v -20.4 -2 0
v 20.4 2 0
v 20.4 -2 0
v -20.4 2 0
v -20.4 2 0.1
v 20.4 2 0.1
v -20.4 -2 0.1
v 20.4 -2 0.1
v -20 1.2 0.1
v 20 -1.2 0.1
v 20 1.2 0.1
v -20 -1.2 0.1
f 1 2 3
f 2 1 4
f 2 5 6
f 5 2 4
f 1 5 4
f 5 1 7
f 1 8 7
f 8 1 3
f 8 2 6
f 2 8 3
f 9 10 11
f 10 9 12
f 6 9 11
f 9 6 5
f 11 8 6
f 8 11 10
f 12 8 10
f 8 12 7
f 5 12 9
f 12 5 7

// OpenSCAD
// file: ../p/4-4edge.scad
use <../lib.scad>
$fa=1; $fs=0.2;
function ldraw_lib__4_4edge(realsolid=false) = [
// 0 Circle 1.0
// 0 Name: 4-4edge.dat
// 0 Author: James Jessiman
// 0 !LDRAW_ORG Primitive UPDATE 2017-01
// 0 !LICENSE Licensed under CC BY 2.0 and CC BY 4.0 : see CAreadme.txt
// 
// 0 BFC CERTIFY CCW
  [0,"BFC","CERTIFY"],
  [0,"BFC","CCW"],
// 
// 0 !HISTORY 1998-12-15 [PTadmin] Official Update 1998-10
// 0 !HISTORY 2005-12-28 [PTadmin] Official Update 2005-01
// 0 !HISTORY 2007-06-24 [PTadmin] Header formatted for Contributor Agreement
// 0 !HISTORY 2008-07-01 [PTadmin] Official Update 2008-01
// 0 !HISTORY 2017-01-15 [Steffen] BFCed
// 0 !HISTORY 2017-12-30 [PTadmin] Official Update 2017-01
// 
// 
// 2 24 1 0 0 0.9239 0 0.3827
  [2,24,1,0,0,0.9239,0,0.3827],
// 2 24 0.9239 0 0.3827 0.7071 0 0.7071
  [2,24,0.9239,0,0.3827,0.7071,0,0.7071],
// 2 24 0.7071 0 0.7071 0.3827 0 0.9239
  [2,24,0.7071,0,0.7071,0.3827,0,0.9239],
// 2 24 0.3827 0 0.9239 0 0 1
  [2,24,0.3827,0,0.9239,0,0,1],
// 2 24 0 0 1 -0.3827 0 0.9239
  [2,24,0,0,1,-0.3827,0,0.9239],
// 2 24 -0.3827 0 0.9239 -0.7071 0 0.7071
  [2,24,-0.3827,0,0.9239,-0.7071,0,0.7071],
// 2 24 -0.7071 0 0.7071 -0.9239 0 0.3827
  [2,24,-0.7071,0,0.7071,-0.9239,0,0.3827],
// 2 24 -0.9239 0 0.3827 -1 0 -0
  [2,24,-0.9239,0,0.3827,-1,0,-0],
// 2 24 -1 0 -0 -0.9239 0 -0.3827
  [2,24,-1,0,-0,-0.9239,0,-0.3827],
// 2 24 -0.9239 0 -0.3827 -0.7071 0 -0.7071
  [2,24,-0.9239,0,-0.3827,-0.7071,0,-0.7071],
// 2 24 -0.7071 0 -0.7071 -0.3827 0 -0.9239
  [2,24,-0.7071,0,-0.7071,-0.3827,0,-0.9239],
// 2 24 -0.3827 0 -0.9239 0 0 -1
  [2,24,-0.3827,0,-0.9239,0,0,-1],
// 2 24 0 0 -1 0.3827 0 -0.9239
  [2,24,0,0,-1,0.3827,0,-0.9239],
// 2 24 0.3827 0 -0.9239 0.7071 0 -0.7071
  [2,24,0.3827,0,-0.9239,0.7071,0,-0.7071],
// 2 24 0.7071 0 -0.7071 0.9239 0 -0.3827
  [2,24,0.7071,0,-0.7071,0.9239,0,-0.3827],
// 2 24 0.9239 0 -0.3827 1 0 0
  [2,24,0.9239,0,-0.3827,1,0,0],
];
module ldraw_lib__4_4edge(step=0, col=false, unit=2/5, alt=false, line=0.2, solid=!$preview)
    makepoly(ldraw_lib__4_4edge(solid), step=step, col=col, unit=unit, alt=alt, line=line, solid=solid);
ldraw_lib__4_4edge(line=0.2);
// file: ../p/4-4disc.scad
use <../lib.scad>
$fa=1; $fs=0.2;
function ldraw_lib__4_4disc(realsolid=false) = [
// 0 Disc 1.0
// 0 Name: 4-4disc.dat
// 0 Author: James Jessiman
// 0 !LDRAW_ORG Primitive UPDATE 2002-02
// 0 !LICENSE Licensed under CC BY 2.0 and CC BY 4.0 : see CAreadme.txt
// 
// 0 BFC CERTIFY CCW
  [0,"BFC","CERTIFY"],
  [0,"BFC","CCW"],
// 
// 0 !HISTORY 1998-12-15 [PTadmin] Official Update 1998-10
// 0 !HISTORY 2002-03-23 [sbliss] Added BFC statement
// 0 !HISTORY 2002-04-25 [PTadmin] Official Update 2002-02
// 0 !HISTORY 2007-06-24 [PTadmin] Header formatted for Contributor Agreement
// 0 !HISTORY 2008-07-01 [PTadmin] Official Update 2008-01
// 
// 
// 3 16 0 0 0 1 0 0 0.9239 0 0.3827
  [3,16,0,0,0,1,0,0,0.9239,0,0.3827],
// 3 16 0 0 0 0.9239 0 0.3827 0.7071 0 0.7071
  [3,16,0,0,0,0.9239,0,0.3827,0.7071,0,0.7071],
// 3 16 0 0 0 0.7071 0 0.7071 0.3827 0 0.9239
  [3,16,0,0,0,0.7071,0,0.7071,0.3827,0,0.9239],
// 3 16 0 0 0 0.3827 0 0.9239 0 0 1
  [3,16,0,0,0,0.3827,0,0.9239,0,0,1],
// 3 16 0 0 0 0 0 1 -0.3827 0 0.9239
  [3,16,0,0,0,0,0,1,-0.3827,0,0.9239],
// 3 16 0 0 0 -0.3827 0 0.9239 -0.7071 0 0.7071
  [3,16,0,0,0,-0.3827,0,0.9239,-0.7071,0,0.7071],
// 3 16 0 0 0 -0.7071 0 0.7071 -0.9239 0 0.3827
  [3,16,0,0,0,-0.7071,0,0.7071,-0.9239,0,0.3827],
// 3 16 0 0 0 -0.9239 0 0.3827 -1 0 -0
  [3,16,0,0,0,-0.9239,0,0.3827,-1,0,-0],
// 3 16 0 0 0 -1 0 -0 -0.9239 0 -0.3827
  [3,16,0,0,0,-1,0,-0,-0.9239,0,-0.3827],
// 3 16 0 0 0 -0.9239 0 -0.3827 -0.7071 0 -0.7071
  [3,16,0,0,0,-0.9239,0,-0.3827,-0.7071,0,-0.7071],
// 3 16 0 0 0 -0.7071 0 -0.7071 -0.3827 0 -0.9239
  [3,16,0,0,0,-0.7071,0,-0.7071,-0.3827,0,-0.9239],
// 3 16 0 0 0 -0.3827 0 -0.9239 0 0 -1
  [3,16,0,0,0,-0.3827,0,-0.9239,0,0,-1],
// 3 16 0 0 0 0 0 -1 0.3827 0 -0.9239
  [3,16,0,0,0,0,0,-1,0.3827,0,-0.9239],
// 3 16 0 0 0 0.3827 0 -0.9239 0.7071 0 -0.7071
  [3,16,0,0,0,0.3827,0,-0.9239,0.7071,0,-0.7071],
// 3 16 0 0 0 0.7071 0 -0.7071 0.9239 0 -0.3827
  [3,16,0,0,0,0.7071,0,-0.7071,0.9239,0,-0.3827],
// 3 16 0 0 0 0.9239 0 -0.3827 1 0 0
  [3,16,0,0,0,0.9239,0,-0.3827,1,0,0],
// 0
];
module ldraw_lib__4_4disc(step=0, col=false, unit=2/5, alt=false, line=0.2, solid=!$preview)
    makepoly(ldraw_lib__4_4disc(solid), step=step, col=col, unit=unit, alt=alt, line=line, solid=solid);
ldraw_lib__4_4disc(line=0.2);
// file: ../p/4-4cyli.scad
use <../lib.scad>
$fa=1; $fs=0.2;
function ldraw_lib__4_4cyli(realsolid=false) = [
// 0 Cylinder 1.0
// 0 Name: 4-4cyli.dat
// 0 Author: James Jessiman
// 0 !LDRAW_ORG Primitive UPDATE 2005-01
// 0 !LICENSE Licensed under CC BY 2.0 and CC BY 4.0 : see CAreadme.txt
// 
// 0 BFC CERTIFY CCW
  [0,"BFC","CERTIFY"],
  [0,"BFC","CCW"],
// 
// 0 !HISTORY 1998-12-15 [PTadmin] Official Update 1998-10
// 0 !HISTORY 2002-03-23 [sbliss] Added BFC statement; merged headers from files in distributions LDraw 0.27 and Complete.
// 0 !HISTORY 2002-04-25 [PTadmin] Official Update 2002-02
// 0 !HISTORY 2004-12-14 [guyvivan] BFC CCW
// 0 !HISTORY 2005-12-28 [PTadmin] Official Update 2005-01
// 0 !HISTORY 2007-06-24 [PTadmin] Header formatted for Contributor Agreement
// 0 !HISTORY 2008-07-01 [PTadmin] Official Update 2008-01
// 
// 
// 4 16 1 1 0 0.9239 1 0.3827 0.9239 0 0.3827 1 0 0
  [4,16,1,1,0,0.9239,1,0.3827,0.9239,0,0.3827,1,0,0],
// 5 24 1 0 0 1 1 0 0.9239 0 0.3827 0.9239 0 -0.3827
  [5,24,1,0,0,1,1,0,0.9239,0,0.3827,0.9239,0,-0.3827],
// 4 16 0.9239 1 0.3827 0.7071 1 0.7071 0.7071 0 0.7071 0.9239 0 0.3827
  [4,16,0.9239,1,0.3827,0.7071,1,0.7071,0.7071,0,0.7071,0.9239,0,0.3827],
// 5 24 0.9239 0 0.3827 0.9239 1 0.3827 0.7071 0 0.7071 1 0 0
  [5,24,0.9239,0,0.3827,0.9239,1,0.3827,0.7071,0,0.7071,1,0,0],
// 4 16 0.7071 1 0.7071 0.3827 1 0.9239 0.3827 0 0.9239 0.7071 0 0.7071
  [4,16,0.7071,1,0.7071,0.3827,1,0.9239,0.3827,0,0.9239,0.7071,0,0.7071],
// 5 24 0.7071 0 0.7071 0.7071 1 0.7071 0.3827 0 0.9239 0.9239 0 0.3827
  [5,24,0.7071,0,0.7071,0.7071,1,0.7071,0.3827,0,0.9239,0.9239,0,0.3827],
// 4 16 0.3827 1 0.9239 0 1 1 0 0 1 0.3827 0 0.9239
  [4,16,0.3827,1,0.9239,0,1,1,0,0,1,0.3827,0,0.9239],
// 5 24 0.3827 0 0.9239 0.3827 1 0.9239 0 0 1 0.7071 0 0.7071
  [5,24,0.3827,0,0.9239,0.3827,1,0.9239,0,0,1,0.7071,0,0.7071],
// 4 16 0 1 1 -0.3827 1 0.9239 -0.3827 0 0.9239 0 0 1
  [4,16,0,1,1,-0.3827,1,0.9239,-0.3827,0,0.9239,0,0,1],
// 5 24 0 0 1 0 1 1 -0.3827 0 0.9239 0.3827 0 0.9239
  [5,24,0,0,1,0,1,1,-0.3827,0,0.9239,0.3827,0,0.9239],
// 4 16 -0.3827 1 0.9239 -0.7071 1 0.7071 -0.7071 0 0.7071 -0.3827 0 0.9239
  [4,16,-0.3827,1,0.9239,-0.7071,1,0.7071,-0.7071,0,0.7071,-0.3827,0,0.9239],
// 5 24 -0.3827 0 0.9239 -0.3827 1 0.9239 -0.7071 0 0.7071 0 0 1
  [5,24,-0.3827,0,0.9239,-0.3827,1,0.9239,-0.7071,0,0.7071,0,0,1],
// 4 16 -0.7071 1 0.7071 -0.9239 1 0.3827 -0.9239 0 0.3827 -0.7071 0 0.7071
  [4,16,-0.7071,1,0.7071,-0.9239,1,0.3827,-0.9239,0,0.3827,-0.7071,0,0.7071],
// 5 24 -0.7071 0 0.7071 -0.7071 1 0.7071 -0.9239 0 0.3827 -0.3827 0 0.9239
  [5,24,-0.7071,0,0.7071,-0.7071,1,0.7071,-0.9239,0,0.3827,-0.3827,0,0.9239],
// 4 16 -0.9239 1 0.3827 -1 1 0 -1 0 0 -0.9239 0 0.3827
  [4,16,-0.9239,1,0.3827,-1,1,0,-1,0,0,-0.9239,0,0.3827],
// 5 24 -0.9239 0 0.3827 -0.9239 1 0.3827 -1 0 0 -0.7071 0 0.7071
  [5,24,-0.9239,0,0.3827,-0.9239,1,0.3827,-1,0,0,-0.7071,0,0.7071],
// 4 16 -1 1 0 -0.9239 1 -0.3827 -0.9239 0 -0.3827 -1 0 0
  [4,16,-1,1,0,-0.9239,1,-0.3827,-0.9239,0,-0.3827,-1,0,0],
// 5 24 -1 0 0 -1 1 0 -0.9239 0 -0.3827 -0.9239 0 0.3827
  [5,24,-1,0,0,-1,1,0,-0.9239,0,-0.3827,-0.9239,0,0.3827],
// 4 16 -0.9239 1 -0.3827 -0.7071 1 -0.7071 -0.7071 0 -0.7071 -0.9239 0 -0.3827
  [4,16,-0.9239,1,-0.3827,-0.7071,1,-0.7071,-0.7071,0,-0.7071,-0.9239,0,-0.3827],
// 5 24 -0.9239 0 -0.3827 -0.9239 1 -0.3827 -0.7071 0 -0.7071 -1 0 0
  [5,24,-0.9239,0,-0.3827,-0.9239,1,-0.3827,-0.7071,0,-0.7071,-1,0,0],
// 4 16 -0.7071 1 -0.7071 -0.3827 1 -0.9239 -0.3827 0 -0.9239 -0.7071 0 -0.7071
  [4,16,-0.7071,1,-0.7071,-0.3827,1,-0.9239,-0.3827,0,-0.9239,-0.7071,0,-0.7071],
// 5 24 -0.7071 0 -0.7071 -0.7071 1 -0.7071 -0.3827 0 -0.9239 -0.9239 0 -0.3827
  [5,24,-0.7071,0,-0.7071,-0.7071,1,-0.7071,-0.3827,0,-0.9239,-0.9239,0,-0.3827],
// 4 16 -0.3827 1 -0.9239 0 1 -1 0 0 -1 -0.3827 0 -0.9239
  [4,16,-0.3827,1,-0.9239,0,1,-1,0,0,-1,-0.3827,0,-0.9239],
// 5 24 -0.3827 0 -0.9239 -0.3827 1 -0.9239 0 0 -1 -0.7071 0 -0.7071
  [5,24,-0.3827,0,-0.9239,-0.3827,1,-0.9239,0,0,-1,-0.7071,0,-0.7071],
// 4 16 0 1 -1 0.3827 1 -0.9239 0.3827 0 -0.9239 0 0 -1
  [4,16,0,1,-1,0.3827,1,-0.9239,0.3827,0,-0.9239,0,0,-1],
// 5 24 0 0 -1 0 1 -1 0.3827 0 -0.9239 -0.3827 0 -0.9239
  [5,24,0,0,-1,0,1,-1,0.3827,0,-0.9239,-0.3827,0,-0.9239],
// 4 16 0.3827 1 -0.9239 0.7071 1 -0.7071 0.7071 0 -0.7071 0.3827 0 -0.9239
  [4,16,0.3827,1,-0.9239,0.7071,1,-0.7071,0.7071,0,-0.7071,0.3827,0,-0.9239],
// 5 24 0.3827 0 -0.9239 0.3827 1 -0.9239 0.7071 0 -0.7071 0 0 -1
  [5,24,0.3827,0,-0.9239,0.3827,1,-0.9239,0.7071,0,-0.7071,0,0,-1],
// 4 16 0.7071 1 -0.7071 0.9239 1 -0.3827 0.9239 0 -0.3827 0.7071 0 -0.7071
  [4,16,0.7071,1,-0.7071,0.9239,1,-0.3827,0.9239,0,-0.3827,0.7071,0,-0.7071],
// 5 24 0.7071 0 -0.7071 0.7071 1 -0.7071 0.9239 0 -0.3827 0.3827 0 -0.9239
  [5,24,0.7071,0,-0.7071,0.7071,1,-0.7071,0.9239,0,-0.3827,0.3827,0,-0.9239],
// 4 16 0.9239 1 -0.3827 1 1 0 1 0 0 0.9239 0 -0.3827
  [4,16,0.9239,1,-0.3827,1,1,0,1,0,0,0.9239,0,-0.3827],
// 5 24 0.9239 0 -0.3827 0.9239 1 -0.3827 1 0 0 0.7071 0 -0.7071
  [5,24,0.9239,0,-0.3827,0.9239,1,-0.3827,1,0,0,0.7071,0,-0.7071],
// 0
];
module ldraw_lib__4_4cyli(step=0, col=false, unit=2/5, alt=false, line=0.2, solid=!$preview)
    makepoly(ldraw_lib__4_4cyli(solid), step=step, col=col, unit=unit, alt=alt, line=line, solid=solid);
ldraw_lib__4_4cyli(line=0.2);
// file: ../p/stud3.scad
use <../lib.scad>
use <4-4cyli.scad>
use <4-4disc.scad>
use <4-4edge.scad>
$fa=1; $fs=0.2;
function ldraw_lib__stud3(realsolid=false) = realsolid ? 
    [openscad(translate([0,0,-eps()], o=cylinder(4+eps(), r=4)),2)] : [
// 0 Stud Tube Solid
// 0 Name: stud3.dat
// 0 Author: James Jessiman
// 0 !LDRAW_ORG Primitive UPDATE 2012-01
// 0 !LICENSE Licensed under CC BY 2.0 and CC BY 4.0 : see CAreadme.txt
// 
// 0 BFC CERTIFY CCW
  [0,"BFC","CERTIFY"],
  [0,"BFC","CCW"],
// 
// 0 !HISTORY 2002-04-04 [sbliss] Modified for BFC compliance
// 0 !HISTORY 2002-04-25 [PTadmin] Official Update 2002-02
// 0 !HISTORY 2007-06-24 [PTadmin] Header formatted for Contributor Agreement
// 0 !HISTORY 2008-07-01 [PTadmin] Official Update 2008-01
// 0 !HISTORY 2012-02-16 [Philo] Changed to CCW
// 0 !HISTORY 2012-03-30 [PTadmin] Official Update 2012-01
// 
// 
// 1 16 0 -4 0 4 0 0 0 1 0 0 0 4 4-4edge.dat
  [1,16,0,-4,0,4,0,0,0,1,0,0,0,4, ldraw_lib__4_4edge(realsolid)],
// 1 16 0 0 0 4 0 0 0 1 0 0 0 4 4-4edge.dat
  [1,16,0,0,0,4,0,0,0,1,0,0,0,4, ldraw_lib__4_4edge(realsolid)],
// 1 16 0 -4 0 4 0 0 0 1 0 0 0 4 4-4disc.dat
  [1,16,0,-4,0,4,0,0,0,1,0,0,0,4, ldraw_lib__4_4disc(realsolid)],
// 1 16 0 -4 0 4 0 0 0 4 0 0 0 4 4-4cyli.dat
  [1,16,0,-4,0,4,0,0,0,4,0,0,0,4, ldraw_lib__4_4cyli(realsolid)],
];
module ldraw_lib__stud3(step=0, col=false, unit=2/5, alt=false, line=0.2, solid=!$preview)
    makepoly(ldraw_lib__stud3(solid), step=step, col=col, unit=unit, alt=alt, line=line, solid=solid);
ldraw_lib__stud3(line=0.2);
// file: ../p/stud.scad
use <../lib.scad>
use <4-4cyli.scad>
use <4-4disc.scad>
use <4-4edge.scad>
$fa=1; $fs=0.2;
function ldraw_lib__stud(realsolid=false) = realsolid ? 
    [openscad(translate([0,0,-eps()], o=cylinder(4+eps(), r=6)),2)] : [
// 0 Stud
// 0 Name: stud.dat
// 0 Author: James Jessiman
// 0 !LDRAW_ORG Primitive UPDATE 2012-01
// 0 !LICENSE Licensed under CC BY 2.0 and CC BY 4.0 : see CAreadme.txt
// 
// 0 BFC CERTIFY CCW
  [0,"BFC","CERTIFY"],
  [0,"BFC","CCW"],
// 
// 0 !HISTORY 2002-04-04 [sbliss] Modified for BFC compliance
// 0 !HISTORY 2002-04-25 [PTadmin] Official Update 2002-02
// 0 !HISTORY 2007-06-24 [PTadmin] Header formatted for Contributor Agreement
// 0 !HISTORY 2008-07-01 [PTadmin] Official Update 2008-01
// 0 !HISTORY 2012-02-16 [Philo] Changed to CCW
// 0 !HISTORY 2012-03-30 [PTadmin] Official Update 2012-01
// 
// 
// 1 16 0 0 0 6 0 0 0 1 0 0 0 6 4-4edge.dat
  [1,16,0,0,0,6,0,0,0,1,0,0,0,6, ldraw_lib__4_4edge(realsolid)],
// 1 16 0 -4 0 6 0 0 0 1 0 0 0 6 4-4edge.dat
  [1,16,0,-4,0,6,0,0,0,1,0,0,0,6, ldraw_lib__4_4edge(realsolid)],
// 1 16 0 0 0 6 0 0 0 -4 0 0 0 6 4-4cyli.dat
  [1,16,0,0,0,6,0,0,0,-4,0,0,0,6, ldraw_lib__4_4cyli(realsolid)],
// 1 16 0 -4 0 6 0 0 0 1 0 0 0 6 4-4disc.dat
  [1,16,0,-4,0,6,0,0,0,1,0,0,0,6, ldraw_lib__4_4disc(realsolid)],
];
module ldraw_lib__stud(step=0, col=false, unit=2/5, alt=false, line=0.2, solid=!$preview)
    makepoly(ldraw_lib__stud(solid), step=step, col=col, unit=unit, alt=alt, line=line, solid=solid);
ldraw_lib__stud(line=0.2);
// file: ../p/box5.scad
use <../lib.scad>
$fa=1; $fs=0.2;
function ldraw_lib__box5(realsolid=false) = [
// 0 Box with 5 Faces and All Edges
// 0 Name: box5.dat
// 0 Author: James Jessiman
// 0 !LDRAW_ORG Primitive UPDATE 2012-01
// 0 !LICENSE Licensed under CC BY 2.0 and CC BY 4.0 : see CAreadme.txt
// 
// 0 BFC CERTIFY CCW
  [0,"BFC","CERTIFY"],
  [0,"BFC","CCW"],
// 
// 0 !HISTORY 2002-04-03 [sbliss] Modified for BFC compliance
// 0 !HISTORY 2002-04-25 [PTadmin] Official Update 2002-02
// 0 !HISTORY 2007-06-24 [PTadmin] Header formatted for Contributor Agreement
// 0 !HISTORY 2008-07-01 [PTadmin] Official Update 2008-01
// 0 !HISTORY 2012-02-16 [Philo] Changed to CCW
// 0 !HISTORY 2012-03-30 [PTadmin] Official Update 2012-01
// 
// 
// 2 24 1 1 1 -1 1 1
  [2,24,1,1,1,-1,1,1],
// 2 24 -1 1 1 -1 1 -1
  [2,24,-1,1,1,-1,1,-1],
// 2 24 -1 1 -1 1 1 -1
  [2,24,-1,1,-1,1,1,-1],
// 2 24 1 1 -1 1 1 1
  [2,24,1,1,-1,1,1,1],
// 2 24 1 0 1 -1 0 1
  [2,24,1,0,1,-1,0,1],
// 2 24 -1 0 1 -1 0 -1
  [2,24,-1,0,1,-1,0,-1],
// 2 24 -1 0 -1 1 0 -1
  [2,24,-1,0,-1,1,0,-1],
// 2 24 1 0 -1 1 0 1
  [2,24,1,0,-1,1,0,1],
// 2 24 1 0 1 1 1 1
  [2,24,1,0,1,1,1,1],
// 2 24 -1 0 1 -1 1 1
  [2,24,-1,0,1,-1,1,1],
// 2 24 1 0 -1 1 1 -1
  [2,24,1,0,-1,1,1,-1],
// 2 24 -1 0 -1 -1 1 -1
  [2,24,-1,0,-1,-1,1,-1],
// 4 16 -1 1 1 1 1 1 1 1 -1 -1 1 -1
  [4,16,-1,1,1,1,1,1,1,1,-1,-1,1,-1],
// 4 16 -1 1 1 -1 0 1 1 0 1 1 1 1
  [4,16,-1,1,1,-1,0,1,1,0,1,1,1,1],
// 4 16 -1 1 -1 -1 0 -1 -1 0 1 -1 1 1
  [4,16,-1,1,-1,-1,0,-1,-1,0,1,-1,1,1],
// 4 16 1 1 -1 1 0 -1 -1 0 -1 -1 1 -1
  [4,16,1,1,-1,1,0,-1,-1,0,-1,-1,1,-1],
// 4 16 1 1 1 1 0 1 1 0 -1 1 1 -1
  [4,16,1,1,1,1,0,1,1,0,-1,1,1,-1],
];
module ldraw_lib__box5(step=0, col=false, unit=2/5, alt=false, line=0.2, solid=!$preview)
    makepoly(ldraw_lib__box5(solid), step=step, col=col, unit=unit, alt=alt, line=line, solid=solid);
ldraw_lib__box5(line=0.2);
// file: ../p/box4t.scad
use <../lib.scad>
$fa=1; $fs=0.2;
function ldraw_lib__box4t(realsolid=false) = [
// 0 Box with 4 Adjacent Faces and All Edges
// 0 Name: box4t.dat
// 0 Author: Tore Eriksson [Tore_Eriksson]
// 0 !LDRAW_ORG Primitive UPDATE 2003-02
// 0 !LICENSE Licensed under CC BY 2.0 and CC BY 4.0 : see CAreadme.txt
// 
// 0 BFC CERTIFY CCW
  [0,"BFC","CERTIFY"],
  [0,"BFC","CCW"],
// 
// 0 !HISTORY 1997-09-29 [PTadmin] Official Update 1997-15
// 0 !HISTORY 2002-08-31 [izanette] Modified with WINDZ for BFC compliance
// 0 !HISTORY 2003-08-01 [PTadmin] Official Update 2003-02
// 0 !HISTORY 2007-06-24 [PTadmin] Header formatted for Contributor Agreement
// 0 !HISTORY 2008-07-01 [PTadmin] Official Update 2008-01
// 
// 
// 2 24 1 1 1 -1 1 1
  [2,24,1,1,1,-1,1,1],
// 2 24 -1 1 1 -1 1 -1
  [2,24,-1,1,1,-1,1,-1],
// 2 24 -1 1 -1 1 1 -1
  [2,24,-1,1,-1,1,1,-1],
// 2 24 1 1 -1 1 1 1
  [2,24,1,1,-1,1,1,1],
// 2 24 1 0 1 -1 0 1
  [2,24,1,0,1,-1,0,1],
// 2 24 -1 0 1 -1 0 -1
  [2,24,-1,0,1,-1,0,-1],
// 2 24 -1 0 -1 1 0 -1
  [2,24,-1,0,-1,1,0,-1],
// 2 24 1 0 -1 1 0 1
  [2,24,1,0,-1,1,0,1],
// 2 24 1 0 1 1 1 1
  [2,24,1,0,1,1,1,1],
// 2 24 -1 0 1 -1 1 1
  [2,24,-1,0,1,-1,1,1],
// 2 24 1 0 -1 1 1 -1
  [2,24,1,0,-1,1,1,-1],
// 2 24 -1 0 -1 -1 1 -1
  [2,24,-1,0,-1,-1,1,-1],
// 4 16 1 1 1 1 1 -1 -1 1 -1 -1 1 1
  [4,16,1,1,1,1,1,-1,-1,1,-1,-1,1,1],
// 4 16 1 1 1 -1 1 1 -1 0 1 1 0 1
  [4,16,1,1,1,-1,1,1,-1,0,1,1,0,1],
// 4 16 -1 1 1 -1 1 -1 -1 0 -1 -1 0 1
  [4,16,-1,1,1,-1,1,-1,-1,0,-1,-1,0,1],
// 0 4 16 -1 1 -1 -1 0 -1 1 0 -1 1 1 -1
// 4 16 1 1 -1 1 1 1 1 0 1 1 0 -1
  [4,16,1,1,-1,1,1,1,1,0,1,1,0,-1],
// 0
];
module ldraw_lib__box4t(step=0, col=false, unit=2/5, alt=false, line=0.2, solid=!$preview)
    makepoly(ldraw_lib__box4t(solid), step=step, col=col, unit=unit, alt=alt, line=line, solid=solid);
ldraw_lib__box4t(line=0.2);
// file: s/3004s01.scad
use <../../lib.scad>
use <../../p/box4t.scad>
use <../../p/box5.scad>
use <../../p/stud.scad>
use <../../p/stud3.scad>
$fa=1; $fs=0.2;
function ldraw_lib__s__3004s01(realsolid=false) = [
// 0 ~Brick  1 x  2 without Front Face
// 0 Name: s\3004s01.dat
// 0 Author: James Jessiman
// 0 !LDRAW_ORG Subpart UPDATE 2003-03
// 0 !LICENSE Licensed under CC BY 2.0 and CC BY 4.0 : see CAreadme.txt
// 
// 0 BFC CERTIFY CCW
  [0,"BFC","CERTIFY"],
  [0,"BFC","CCW"],
// 
// 0 !HISTORY 2003-09-07 [jriley] Subfiling, BFC
// 0 !HISTORY 2003-12-19 [PTadmin] Official Update 2003-03
// 0 !HISTORY 2007-08-29 [PTadmin] Header formatted for Contributor Agreement
// 0 !HISTORY 2008-07-01 [PTadmin] Official Update 2008-01
// 
// 
// 1 16 0 4 0 1 0 0 0 -5 0 0 0 1 stud3.dat
  [1,16,0,4,0,1,0,0,0,-5,0,0,0,1, ldraw_lib__stud3(realsolid)],
// 0 BFC INVERTNEXT
  [0,"BFC","INVERTNEXT"],
// 1 16 0 24 0 16 0 0 0 -20 0 0 0 6 box5.dat
  [1,16,0,24,0,16,0,0,0,-20,0,0,0,6, ldraw_lib__box5(realsolid)],
// 4 16 20 24 10 16 24 6 -16 24 6 -20 24 10
  [4,16,20,24,10,16,24,6,-16,24,6,-20,24,10],
// 4 16 -20 24 10 -16 24 6 -16 24 -6 -20 24 -10
  [4,16,-20,24,10,-16,24,6,-16,24,-6,-20,24,-10],
// 4 16 -20 24 -10 -16 24 -6 16 24 -6 20 24 -10
  [4,16,-20,24,-10,-16,24,-6,16,24,-6,20,24,-10],
// 4 16 20 24 -10 16 24 -6 16 24 6 20 24 10
  [4,16,20,24,-10,16,24,-6,16,24,6,20,24,10],
// 1 16 0 24 0 20 0 0 0 -24 0 0 0 10 box4t.dat
  [1,16,0,24,0,20,0,0,0,-24,0,0,0,10, ldraw_lib__box4t(realsolid)],
// 1 16 10 0 0 1 0 0 0 1 0 0 0 1 stud.dat
  [1,16,10,0,0,1,0,0,0,1,0,0,0,1, ldraw_lib__stud(realsolid)],
// 1 16 -10 0 0 1 0 0 0 1 0 0 0 1 stud.dat
  [1,16,-10,0,0,1,0,0,0,1,0,0,0,1, ldraw_lib__stud(realsolid)],
// 0
];
module ldraw_lib__s__3004s01(step=0, col=false, unit=2/5, alt=false, line=0.2, solid=!$preview)
    makepoly(ldraw_lib__s__3004s01(solid), step=step, col=col, unit=unit, alt=alt, line=line, solid=solid);
ldraw_lib__s__3004s01(line=0.2);
// file: 3004.scad
use <../lib.scad>
use <s/3004s01.scad>
$fa=1; $fs=0.2;
function ldraw_lib__3004(realsolid=false) = [
// 0 Brick  1 x  2
// 0 Name: 3004.dat
// 0 Author: James Jessiman
// 0 !LDRAW_ORG Part UPDATE 2022-05
// 0 !LICENSE Licensed under CC BY 2.0 and CC BY 4.0 : see CAreadme.txt
// 
// 0 BFC CERTIFY CCW
  [0,"BFC","CERTIFY"],
  [0,"BFC","CCW"],
// 
// 0 !HISTORY 2001-10-26 [PTadmin] Official Update 2001-01
// 0 !HISTORY 2002-05-07 {unknown} BFC Certification
// 0 !HISTORY 2002-06-11 [PTadmin] Official Update 2002-03
// 0 !HISTORY 2007-05-07 [PTadmin] Header formatted for Contributor Agreement
// 0 !HISTORY 2008-07-01 [PTadmin] Official Update 2008-01
// 0 !HISTORY 2022-08-04 [MagFors] Using subfile
// 0 !HISTORY 2022-09-15 [PTadmin] Official Update 2022-05
// 
// 
// 1 16 0 0 0 1 0 0 0 1 0 0 0 1 s\3004s01.dat
  [1,16,0,0,0,1,0,0,0,1,0,0,0,1, ldraw_lib__s__3004s01(realsolid)],
// 4 16 -20 24 -10 20 24 -10 20 0 -10 -20 0 -10
  [4,16,-20,24,-10,20,24,-10,20,0,-10,-20,0,-10],
];
module ldraw_lib__3004(step=0, col=false, unit=2/5, alt=false, line=0.2, solid=!$preview)
    makepoly(ldraw_lib__3004(solid), step=step, col=col, unit=unit, alt=alt, line=line, solid=solid);
ldraw_lib__3004(line=0.2);
// file: ../p/box5-12.scad
use <../lib.scad>
$fa=1; $fs=0.2;
function ldraw_lib__box5_12(realsolid=false) = [
// 0 Box with 5 Faces without Any Edges
// 0 Name: box5-12.dat
// 0 Author: Chris Dee [cwdee]
// 0 !LDRAW_ORG Primitive UPDATE 2009-02
// 0 !LICENSE Licensed under CC BY 2.0 and CC BY 4.0 : see CAreadme.txt
// 
// 0 BFC CERTIFY CCW
  [0,"BFC","CERTIFY"],
  [0,"BFC","CCW"],
// 
// 0 !HISTORY 2009-09-03 [PTadmin] Official Update 2009-02
// 
// 
// 4 16 1 1 1 1 1 -1 -1 1 -1 -1 1 1
  [4,16,1,1,1,1,1,-1,-1,1,-1,-1,1,1],
// 4 16 -1 0 1 1 0 1 1 1 1 -1 1 1
  [4,16,-1,0,1,1,0,1,1,1,1,-1,1,1],
// 4 16 -1 0 -1 -1 0 1 -1 1 1 -1 1 -1
  [4,16,-1,0,-1,-1,0,1,-1,1,1,-1,1,-1],
// 4 16 1 0 -1 -1 0 -1 -1 1 -1 1 1 -1
  [4,16,1,0,-1,-1,0,-1,-1,1,-1,1,1,-1],
// 4 16 1 0 1 1 0 -1 1 1 -1 1 1 1
  [4,16,1,0,1,1,0,-1,1,1,-1,1,1,1],
// 0
];
module ldraw_lib__box5_12(step=0, col=false, unit=2/5, alt=false, line=0.2, solid=!$preview)
    makepoly(ldraw_lib__box5_12(solid), step=step, col=col, unit=unit, alt=alt, line=line, solid=solid);
ldraw_lib__box5_12(line=0.2);
// main file
use <../lib.scad>
use <../p/box5-12.scad>
$fa=1; $fs=0.2;
function ldraw_lib__820672c(realsolid=false) = [
// 0 Sticker  0.5 x  5.1 with White Line
// 0 Name: 820672c.dat
// 0 Author: Takeshi Takahashi [RainbowDolphin]
// 0 !LDRAW_ORG Part UPDATE 2022-04
// 0 !LICENSE Licensed under CC BY 2.0 and CC BY 4.0 : see CAreadme.txt
// 
// 0 BFC CERTIFY CCW
  [0,"BFC","CERTIFY"],
  [0,"BFC","CCW"],
// 
// 0 !KEYWORDS harbour, Seaport, Set 6541, ship
// 
// 0 !HISTORY 2022-07-18 [PTadmin] Official Update 2022-04
// 
// 
// 1 16 0 -0.25 0 51 0 0 0 0.25 0 0 0 5 box5-12.dat
  [1,16,0,-0.25,0,51,0,0,0,0.25,0,0,0,5, ldraw_lib__box5_12(realsolid)],
// 0 BFC NOCLIP
  [0,"BFC","NOCLIP"],
// 4 15 50 -0.25 3 -50 -0.25 3 -50 -0.25 -3 50 -0.25 -3
  [4,15,50,-0.25,3,-50,-0.25,3,-50,-0.25,-3,50,-0.25,-3],
// 0 BFC CLIP
  [0,"BFC","CLIP"],
// 4 16 51 -0.25 5 -51 -0.25 5 -50 -0.25 3 50 -0.25 3
  [4,16,51,-0.25,5,-51,-0.25,5,-50,-0.25,3,50,-0.25,3],
// 4 16 51 -0.25 -5 51 -0.25 5 50 -0.25 3 50 -0.25 -3
  [4,16,51,-0.25,-5,51,-0.25,5,50,-0.25,3,50,-0.25,-3],
// 4 16 -51 -0.25 -5 51 -0.25 -5 50 -0.25 -3 -50 -0.25 -3
  [4,16,-51,-0.25,-5,51,-0.25,-5,50,-0.25,-3,-50,-0.25,-3],
// 4 16 -51 -0.25 5 -51 -0.25 -5 -50 -0.25 -3 -50 -0.25 3
  [4,16,-51,-0.25,5,-51,-0.25,-5,-50,-0.25,-3,-50,-0.25,3],
];
module ldraw_lib__820672c(step=0, col=false, unit=2/5, alt=false, line=0.2, solid=!$preview)
    makepoly(ldraw_lib__820672c(solid), step=step, col=col, unit=unit, alt=alt, line=line, solid=solid);
ldraw_lib__820672c(line=0.2);
